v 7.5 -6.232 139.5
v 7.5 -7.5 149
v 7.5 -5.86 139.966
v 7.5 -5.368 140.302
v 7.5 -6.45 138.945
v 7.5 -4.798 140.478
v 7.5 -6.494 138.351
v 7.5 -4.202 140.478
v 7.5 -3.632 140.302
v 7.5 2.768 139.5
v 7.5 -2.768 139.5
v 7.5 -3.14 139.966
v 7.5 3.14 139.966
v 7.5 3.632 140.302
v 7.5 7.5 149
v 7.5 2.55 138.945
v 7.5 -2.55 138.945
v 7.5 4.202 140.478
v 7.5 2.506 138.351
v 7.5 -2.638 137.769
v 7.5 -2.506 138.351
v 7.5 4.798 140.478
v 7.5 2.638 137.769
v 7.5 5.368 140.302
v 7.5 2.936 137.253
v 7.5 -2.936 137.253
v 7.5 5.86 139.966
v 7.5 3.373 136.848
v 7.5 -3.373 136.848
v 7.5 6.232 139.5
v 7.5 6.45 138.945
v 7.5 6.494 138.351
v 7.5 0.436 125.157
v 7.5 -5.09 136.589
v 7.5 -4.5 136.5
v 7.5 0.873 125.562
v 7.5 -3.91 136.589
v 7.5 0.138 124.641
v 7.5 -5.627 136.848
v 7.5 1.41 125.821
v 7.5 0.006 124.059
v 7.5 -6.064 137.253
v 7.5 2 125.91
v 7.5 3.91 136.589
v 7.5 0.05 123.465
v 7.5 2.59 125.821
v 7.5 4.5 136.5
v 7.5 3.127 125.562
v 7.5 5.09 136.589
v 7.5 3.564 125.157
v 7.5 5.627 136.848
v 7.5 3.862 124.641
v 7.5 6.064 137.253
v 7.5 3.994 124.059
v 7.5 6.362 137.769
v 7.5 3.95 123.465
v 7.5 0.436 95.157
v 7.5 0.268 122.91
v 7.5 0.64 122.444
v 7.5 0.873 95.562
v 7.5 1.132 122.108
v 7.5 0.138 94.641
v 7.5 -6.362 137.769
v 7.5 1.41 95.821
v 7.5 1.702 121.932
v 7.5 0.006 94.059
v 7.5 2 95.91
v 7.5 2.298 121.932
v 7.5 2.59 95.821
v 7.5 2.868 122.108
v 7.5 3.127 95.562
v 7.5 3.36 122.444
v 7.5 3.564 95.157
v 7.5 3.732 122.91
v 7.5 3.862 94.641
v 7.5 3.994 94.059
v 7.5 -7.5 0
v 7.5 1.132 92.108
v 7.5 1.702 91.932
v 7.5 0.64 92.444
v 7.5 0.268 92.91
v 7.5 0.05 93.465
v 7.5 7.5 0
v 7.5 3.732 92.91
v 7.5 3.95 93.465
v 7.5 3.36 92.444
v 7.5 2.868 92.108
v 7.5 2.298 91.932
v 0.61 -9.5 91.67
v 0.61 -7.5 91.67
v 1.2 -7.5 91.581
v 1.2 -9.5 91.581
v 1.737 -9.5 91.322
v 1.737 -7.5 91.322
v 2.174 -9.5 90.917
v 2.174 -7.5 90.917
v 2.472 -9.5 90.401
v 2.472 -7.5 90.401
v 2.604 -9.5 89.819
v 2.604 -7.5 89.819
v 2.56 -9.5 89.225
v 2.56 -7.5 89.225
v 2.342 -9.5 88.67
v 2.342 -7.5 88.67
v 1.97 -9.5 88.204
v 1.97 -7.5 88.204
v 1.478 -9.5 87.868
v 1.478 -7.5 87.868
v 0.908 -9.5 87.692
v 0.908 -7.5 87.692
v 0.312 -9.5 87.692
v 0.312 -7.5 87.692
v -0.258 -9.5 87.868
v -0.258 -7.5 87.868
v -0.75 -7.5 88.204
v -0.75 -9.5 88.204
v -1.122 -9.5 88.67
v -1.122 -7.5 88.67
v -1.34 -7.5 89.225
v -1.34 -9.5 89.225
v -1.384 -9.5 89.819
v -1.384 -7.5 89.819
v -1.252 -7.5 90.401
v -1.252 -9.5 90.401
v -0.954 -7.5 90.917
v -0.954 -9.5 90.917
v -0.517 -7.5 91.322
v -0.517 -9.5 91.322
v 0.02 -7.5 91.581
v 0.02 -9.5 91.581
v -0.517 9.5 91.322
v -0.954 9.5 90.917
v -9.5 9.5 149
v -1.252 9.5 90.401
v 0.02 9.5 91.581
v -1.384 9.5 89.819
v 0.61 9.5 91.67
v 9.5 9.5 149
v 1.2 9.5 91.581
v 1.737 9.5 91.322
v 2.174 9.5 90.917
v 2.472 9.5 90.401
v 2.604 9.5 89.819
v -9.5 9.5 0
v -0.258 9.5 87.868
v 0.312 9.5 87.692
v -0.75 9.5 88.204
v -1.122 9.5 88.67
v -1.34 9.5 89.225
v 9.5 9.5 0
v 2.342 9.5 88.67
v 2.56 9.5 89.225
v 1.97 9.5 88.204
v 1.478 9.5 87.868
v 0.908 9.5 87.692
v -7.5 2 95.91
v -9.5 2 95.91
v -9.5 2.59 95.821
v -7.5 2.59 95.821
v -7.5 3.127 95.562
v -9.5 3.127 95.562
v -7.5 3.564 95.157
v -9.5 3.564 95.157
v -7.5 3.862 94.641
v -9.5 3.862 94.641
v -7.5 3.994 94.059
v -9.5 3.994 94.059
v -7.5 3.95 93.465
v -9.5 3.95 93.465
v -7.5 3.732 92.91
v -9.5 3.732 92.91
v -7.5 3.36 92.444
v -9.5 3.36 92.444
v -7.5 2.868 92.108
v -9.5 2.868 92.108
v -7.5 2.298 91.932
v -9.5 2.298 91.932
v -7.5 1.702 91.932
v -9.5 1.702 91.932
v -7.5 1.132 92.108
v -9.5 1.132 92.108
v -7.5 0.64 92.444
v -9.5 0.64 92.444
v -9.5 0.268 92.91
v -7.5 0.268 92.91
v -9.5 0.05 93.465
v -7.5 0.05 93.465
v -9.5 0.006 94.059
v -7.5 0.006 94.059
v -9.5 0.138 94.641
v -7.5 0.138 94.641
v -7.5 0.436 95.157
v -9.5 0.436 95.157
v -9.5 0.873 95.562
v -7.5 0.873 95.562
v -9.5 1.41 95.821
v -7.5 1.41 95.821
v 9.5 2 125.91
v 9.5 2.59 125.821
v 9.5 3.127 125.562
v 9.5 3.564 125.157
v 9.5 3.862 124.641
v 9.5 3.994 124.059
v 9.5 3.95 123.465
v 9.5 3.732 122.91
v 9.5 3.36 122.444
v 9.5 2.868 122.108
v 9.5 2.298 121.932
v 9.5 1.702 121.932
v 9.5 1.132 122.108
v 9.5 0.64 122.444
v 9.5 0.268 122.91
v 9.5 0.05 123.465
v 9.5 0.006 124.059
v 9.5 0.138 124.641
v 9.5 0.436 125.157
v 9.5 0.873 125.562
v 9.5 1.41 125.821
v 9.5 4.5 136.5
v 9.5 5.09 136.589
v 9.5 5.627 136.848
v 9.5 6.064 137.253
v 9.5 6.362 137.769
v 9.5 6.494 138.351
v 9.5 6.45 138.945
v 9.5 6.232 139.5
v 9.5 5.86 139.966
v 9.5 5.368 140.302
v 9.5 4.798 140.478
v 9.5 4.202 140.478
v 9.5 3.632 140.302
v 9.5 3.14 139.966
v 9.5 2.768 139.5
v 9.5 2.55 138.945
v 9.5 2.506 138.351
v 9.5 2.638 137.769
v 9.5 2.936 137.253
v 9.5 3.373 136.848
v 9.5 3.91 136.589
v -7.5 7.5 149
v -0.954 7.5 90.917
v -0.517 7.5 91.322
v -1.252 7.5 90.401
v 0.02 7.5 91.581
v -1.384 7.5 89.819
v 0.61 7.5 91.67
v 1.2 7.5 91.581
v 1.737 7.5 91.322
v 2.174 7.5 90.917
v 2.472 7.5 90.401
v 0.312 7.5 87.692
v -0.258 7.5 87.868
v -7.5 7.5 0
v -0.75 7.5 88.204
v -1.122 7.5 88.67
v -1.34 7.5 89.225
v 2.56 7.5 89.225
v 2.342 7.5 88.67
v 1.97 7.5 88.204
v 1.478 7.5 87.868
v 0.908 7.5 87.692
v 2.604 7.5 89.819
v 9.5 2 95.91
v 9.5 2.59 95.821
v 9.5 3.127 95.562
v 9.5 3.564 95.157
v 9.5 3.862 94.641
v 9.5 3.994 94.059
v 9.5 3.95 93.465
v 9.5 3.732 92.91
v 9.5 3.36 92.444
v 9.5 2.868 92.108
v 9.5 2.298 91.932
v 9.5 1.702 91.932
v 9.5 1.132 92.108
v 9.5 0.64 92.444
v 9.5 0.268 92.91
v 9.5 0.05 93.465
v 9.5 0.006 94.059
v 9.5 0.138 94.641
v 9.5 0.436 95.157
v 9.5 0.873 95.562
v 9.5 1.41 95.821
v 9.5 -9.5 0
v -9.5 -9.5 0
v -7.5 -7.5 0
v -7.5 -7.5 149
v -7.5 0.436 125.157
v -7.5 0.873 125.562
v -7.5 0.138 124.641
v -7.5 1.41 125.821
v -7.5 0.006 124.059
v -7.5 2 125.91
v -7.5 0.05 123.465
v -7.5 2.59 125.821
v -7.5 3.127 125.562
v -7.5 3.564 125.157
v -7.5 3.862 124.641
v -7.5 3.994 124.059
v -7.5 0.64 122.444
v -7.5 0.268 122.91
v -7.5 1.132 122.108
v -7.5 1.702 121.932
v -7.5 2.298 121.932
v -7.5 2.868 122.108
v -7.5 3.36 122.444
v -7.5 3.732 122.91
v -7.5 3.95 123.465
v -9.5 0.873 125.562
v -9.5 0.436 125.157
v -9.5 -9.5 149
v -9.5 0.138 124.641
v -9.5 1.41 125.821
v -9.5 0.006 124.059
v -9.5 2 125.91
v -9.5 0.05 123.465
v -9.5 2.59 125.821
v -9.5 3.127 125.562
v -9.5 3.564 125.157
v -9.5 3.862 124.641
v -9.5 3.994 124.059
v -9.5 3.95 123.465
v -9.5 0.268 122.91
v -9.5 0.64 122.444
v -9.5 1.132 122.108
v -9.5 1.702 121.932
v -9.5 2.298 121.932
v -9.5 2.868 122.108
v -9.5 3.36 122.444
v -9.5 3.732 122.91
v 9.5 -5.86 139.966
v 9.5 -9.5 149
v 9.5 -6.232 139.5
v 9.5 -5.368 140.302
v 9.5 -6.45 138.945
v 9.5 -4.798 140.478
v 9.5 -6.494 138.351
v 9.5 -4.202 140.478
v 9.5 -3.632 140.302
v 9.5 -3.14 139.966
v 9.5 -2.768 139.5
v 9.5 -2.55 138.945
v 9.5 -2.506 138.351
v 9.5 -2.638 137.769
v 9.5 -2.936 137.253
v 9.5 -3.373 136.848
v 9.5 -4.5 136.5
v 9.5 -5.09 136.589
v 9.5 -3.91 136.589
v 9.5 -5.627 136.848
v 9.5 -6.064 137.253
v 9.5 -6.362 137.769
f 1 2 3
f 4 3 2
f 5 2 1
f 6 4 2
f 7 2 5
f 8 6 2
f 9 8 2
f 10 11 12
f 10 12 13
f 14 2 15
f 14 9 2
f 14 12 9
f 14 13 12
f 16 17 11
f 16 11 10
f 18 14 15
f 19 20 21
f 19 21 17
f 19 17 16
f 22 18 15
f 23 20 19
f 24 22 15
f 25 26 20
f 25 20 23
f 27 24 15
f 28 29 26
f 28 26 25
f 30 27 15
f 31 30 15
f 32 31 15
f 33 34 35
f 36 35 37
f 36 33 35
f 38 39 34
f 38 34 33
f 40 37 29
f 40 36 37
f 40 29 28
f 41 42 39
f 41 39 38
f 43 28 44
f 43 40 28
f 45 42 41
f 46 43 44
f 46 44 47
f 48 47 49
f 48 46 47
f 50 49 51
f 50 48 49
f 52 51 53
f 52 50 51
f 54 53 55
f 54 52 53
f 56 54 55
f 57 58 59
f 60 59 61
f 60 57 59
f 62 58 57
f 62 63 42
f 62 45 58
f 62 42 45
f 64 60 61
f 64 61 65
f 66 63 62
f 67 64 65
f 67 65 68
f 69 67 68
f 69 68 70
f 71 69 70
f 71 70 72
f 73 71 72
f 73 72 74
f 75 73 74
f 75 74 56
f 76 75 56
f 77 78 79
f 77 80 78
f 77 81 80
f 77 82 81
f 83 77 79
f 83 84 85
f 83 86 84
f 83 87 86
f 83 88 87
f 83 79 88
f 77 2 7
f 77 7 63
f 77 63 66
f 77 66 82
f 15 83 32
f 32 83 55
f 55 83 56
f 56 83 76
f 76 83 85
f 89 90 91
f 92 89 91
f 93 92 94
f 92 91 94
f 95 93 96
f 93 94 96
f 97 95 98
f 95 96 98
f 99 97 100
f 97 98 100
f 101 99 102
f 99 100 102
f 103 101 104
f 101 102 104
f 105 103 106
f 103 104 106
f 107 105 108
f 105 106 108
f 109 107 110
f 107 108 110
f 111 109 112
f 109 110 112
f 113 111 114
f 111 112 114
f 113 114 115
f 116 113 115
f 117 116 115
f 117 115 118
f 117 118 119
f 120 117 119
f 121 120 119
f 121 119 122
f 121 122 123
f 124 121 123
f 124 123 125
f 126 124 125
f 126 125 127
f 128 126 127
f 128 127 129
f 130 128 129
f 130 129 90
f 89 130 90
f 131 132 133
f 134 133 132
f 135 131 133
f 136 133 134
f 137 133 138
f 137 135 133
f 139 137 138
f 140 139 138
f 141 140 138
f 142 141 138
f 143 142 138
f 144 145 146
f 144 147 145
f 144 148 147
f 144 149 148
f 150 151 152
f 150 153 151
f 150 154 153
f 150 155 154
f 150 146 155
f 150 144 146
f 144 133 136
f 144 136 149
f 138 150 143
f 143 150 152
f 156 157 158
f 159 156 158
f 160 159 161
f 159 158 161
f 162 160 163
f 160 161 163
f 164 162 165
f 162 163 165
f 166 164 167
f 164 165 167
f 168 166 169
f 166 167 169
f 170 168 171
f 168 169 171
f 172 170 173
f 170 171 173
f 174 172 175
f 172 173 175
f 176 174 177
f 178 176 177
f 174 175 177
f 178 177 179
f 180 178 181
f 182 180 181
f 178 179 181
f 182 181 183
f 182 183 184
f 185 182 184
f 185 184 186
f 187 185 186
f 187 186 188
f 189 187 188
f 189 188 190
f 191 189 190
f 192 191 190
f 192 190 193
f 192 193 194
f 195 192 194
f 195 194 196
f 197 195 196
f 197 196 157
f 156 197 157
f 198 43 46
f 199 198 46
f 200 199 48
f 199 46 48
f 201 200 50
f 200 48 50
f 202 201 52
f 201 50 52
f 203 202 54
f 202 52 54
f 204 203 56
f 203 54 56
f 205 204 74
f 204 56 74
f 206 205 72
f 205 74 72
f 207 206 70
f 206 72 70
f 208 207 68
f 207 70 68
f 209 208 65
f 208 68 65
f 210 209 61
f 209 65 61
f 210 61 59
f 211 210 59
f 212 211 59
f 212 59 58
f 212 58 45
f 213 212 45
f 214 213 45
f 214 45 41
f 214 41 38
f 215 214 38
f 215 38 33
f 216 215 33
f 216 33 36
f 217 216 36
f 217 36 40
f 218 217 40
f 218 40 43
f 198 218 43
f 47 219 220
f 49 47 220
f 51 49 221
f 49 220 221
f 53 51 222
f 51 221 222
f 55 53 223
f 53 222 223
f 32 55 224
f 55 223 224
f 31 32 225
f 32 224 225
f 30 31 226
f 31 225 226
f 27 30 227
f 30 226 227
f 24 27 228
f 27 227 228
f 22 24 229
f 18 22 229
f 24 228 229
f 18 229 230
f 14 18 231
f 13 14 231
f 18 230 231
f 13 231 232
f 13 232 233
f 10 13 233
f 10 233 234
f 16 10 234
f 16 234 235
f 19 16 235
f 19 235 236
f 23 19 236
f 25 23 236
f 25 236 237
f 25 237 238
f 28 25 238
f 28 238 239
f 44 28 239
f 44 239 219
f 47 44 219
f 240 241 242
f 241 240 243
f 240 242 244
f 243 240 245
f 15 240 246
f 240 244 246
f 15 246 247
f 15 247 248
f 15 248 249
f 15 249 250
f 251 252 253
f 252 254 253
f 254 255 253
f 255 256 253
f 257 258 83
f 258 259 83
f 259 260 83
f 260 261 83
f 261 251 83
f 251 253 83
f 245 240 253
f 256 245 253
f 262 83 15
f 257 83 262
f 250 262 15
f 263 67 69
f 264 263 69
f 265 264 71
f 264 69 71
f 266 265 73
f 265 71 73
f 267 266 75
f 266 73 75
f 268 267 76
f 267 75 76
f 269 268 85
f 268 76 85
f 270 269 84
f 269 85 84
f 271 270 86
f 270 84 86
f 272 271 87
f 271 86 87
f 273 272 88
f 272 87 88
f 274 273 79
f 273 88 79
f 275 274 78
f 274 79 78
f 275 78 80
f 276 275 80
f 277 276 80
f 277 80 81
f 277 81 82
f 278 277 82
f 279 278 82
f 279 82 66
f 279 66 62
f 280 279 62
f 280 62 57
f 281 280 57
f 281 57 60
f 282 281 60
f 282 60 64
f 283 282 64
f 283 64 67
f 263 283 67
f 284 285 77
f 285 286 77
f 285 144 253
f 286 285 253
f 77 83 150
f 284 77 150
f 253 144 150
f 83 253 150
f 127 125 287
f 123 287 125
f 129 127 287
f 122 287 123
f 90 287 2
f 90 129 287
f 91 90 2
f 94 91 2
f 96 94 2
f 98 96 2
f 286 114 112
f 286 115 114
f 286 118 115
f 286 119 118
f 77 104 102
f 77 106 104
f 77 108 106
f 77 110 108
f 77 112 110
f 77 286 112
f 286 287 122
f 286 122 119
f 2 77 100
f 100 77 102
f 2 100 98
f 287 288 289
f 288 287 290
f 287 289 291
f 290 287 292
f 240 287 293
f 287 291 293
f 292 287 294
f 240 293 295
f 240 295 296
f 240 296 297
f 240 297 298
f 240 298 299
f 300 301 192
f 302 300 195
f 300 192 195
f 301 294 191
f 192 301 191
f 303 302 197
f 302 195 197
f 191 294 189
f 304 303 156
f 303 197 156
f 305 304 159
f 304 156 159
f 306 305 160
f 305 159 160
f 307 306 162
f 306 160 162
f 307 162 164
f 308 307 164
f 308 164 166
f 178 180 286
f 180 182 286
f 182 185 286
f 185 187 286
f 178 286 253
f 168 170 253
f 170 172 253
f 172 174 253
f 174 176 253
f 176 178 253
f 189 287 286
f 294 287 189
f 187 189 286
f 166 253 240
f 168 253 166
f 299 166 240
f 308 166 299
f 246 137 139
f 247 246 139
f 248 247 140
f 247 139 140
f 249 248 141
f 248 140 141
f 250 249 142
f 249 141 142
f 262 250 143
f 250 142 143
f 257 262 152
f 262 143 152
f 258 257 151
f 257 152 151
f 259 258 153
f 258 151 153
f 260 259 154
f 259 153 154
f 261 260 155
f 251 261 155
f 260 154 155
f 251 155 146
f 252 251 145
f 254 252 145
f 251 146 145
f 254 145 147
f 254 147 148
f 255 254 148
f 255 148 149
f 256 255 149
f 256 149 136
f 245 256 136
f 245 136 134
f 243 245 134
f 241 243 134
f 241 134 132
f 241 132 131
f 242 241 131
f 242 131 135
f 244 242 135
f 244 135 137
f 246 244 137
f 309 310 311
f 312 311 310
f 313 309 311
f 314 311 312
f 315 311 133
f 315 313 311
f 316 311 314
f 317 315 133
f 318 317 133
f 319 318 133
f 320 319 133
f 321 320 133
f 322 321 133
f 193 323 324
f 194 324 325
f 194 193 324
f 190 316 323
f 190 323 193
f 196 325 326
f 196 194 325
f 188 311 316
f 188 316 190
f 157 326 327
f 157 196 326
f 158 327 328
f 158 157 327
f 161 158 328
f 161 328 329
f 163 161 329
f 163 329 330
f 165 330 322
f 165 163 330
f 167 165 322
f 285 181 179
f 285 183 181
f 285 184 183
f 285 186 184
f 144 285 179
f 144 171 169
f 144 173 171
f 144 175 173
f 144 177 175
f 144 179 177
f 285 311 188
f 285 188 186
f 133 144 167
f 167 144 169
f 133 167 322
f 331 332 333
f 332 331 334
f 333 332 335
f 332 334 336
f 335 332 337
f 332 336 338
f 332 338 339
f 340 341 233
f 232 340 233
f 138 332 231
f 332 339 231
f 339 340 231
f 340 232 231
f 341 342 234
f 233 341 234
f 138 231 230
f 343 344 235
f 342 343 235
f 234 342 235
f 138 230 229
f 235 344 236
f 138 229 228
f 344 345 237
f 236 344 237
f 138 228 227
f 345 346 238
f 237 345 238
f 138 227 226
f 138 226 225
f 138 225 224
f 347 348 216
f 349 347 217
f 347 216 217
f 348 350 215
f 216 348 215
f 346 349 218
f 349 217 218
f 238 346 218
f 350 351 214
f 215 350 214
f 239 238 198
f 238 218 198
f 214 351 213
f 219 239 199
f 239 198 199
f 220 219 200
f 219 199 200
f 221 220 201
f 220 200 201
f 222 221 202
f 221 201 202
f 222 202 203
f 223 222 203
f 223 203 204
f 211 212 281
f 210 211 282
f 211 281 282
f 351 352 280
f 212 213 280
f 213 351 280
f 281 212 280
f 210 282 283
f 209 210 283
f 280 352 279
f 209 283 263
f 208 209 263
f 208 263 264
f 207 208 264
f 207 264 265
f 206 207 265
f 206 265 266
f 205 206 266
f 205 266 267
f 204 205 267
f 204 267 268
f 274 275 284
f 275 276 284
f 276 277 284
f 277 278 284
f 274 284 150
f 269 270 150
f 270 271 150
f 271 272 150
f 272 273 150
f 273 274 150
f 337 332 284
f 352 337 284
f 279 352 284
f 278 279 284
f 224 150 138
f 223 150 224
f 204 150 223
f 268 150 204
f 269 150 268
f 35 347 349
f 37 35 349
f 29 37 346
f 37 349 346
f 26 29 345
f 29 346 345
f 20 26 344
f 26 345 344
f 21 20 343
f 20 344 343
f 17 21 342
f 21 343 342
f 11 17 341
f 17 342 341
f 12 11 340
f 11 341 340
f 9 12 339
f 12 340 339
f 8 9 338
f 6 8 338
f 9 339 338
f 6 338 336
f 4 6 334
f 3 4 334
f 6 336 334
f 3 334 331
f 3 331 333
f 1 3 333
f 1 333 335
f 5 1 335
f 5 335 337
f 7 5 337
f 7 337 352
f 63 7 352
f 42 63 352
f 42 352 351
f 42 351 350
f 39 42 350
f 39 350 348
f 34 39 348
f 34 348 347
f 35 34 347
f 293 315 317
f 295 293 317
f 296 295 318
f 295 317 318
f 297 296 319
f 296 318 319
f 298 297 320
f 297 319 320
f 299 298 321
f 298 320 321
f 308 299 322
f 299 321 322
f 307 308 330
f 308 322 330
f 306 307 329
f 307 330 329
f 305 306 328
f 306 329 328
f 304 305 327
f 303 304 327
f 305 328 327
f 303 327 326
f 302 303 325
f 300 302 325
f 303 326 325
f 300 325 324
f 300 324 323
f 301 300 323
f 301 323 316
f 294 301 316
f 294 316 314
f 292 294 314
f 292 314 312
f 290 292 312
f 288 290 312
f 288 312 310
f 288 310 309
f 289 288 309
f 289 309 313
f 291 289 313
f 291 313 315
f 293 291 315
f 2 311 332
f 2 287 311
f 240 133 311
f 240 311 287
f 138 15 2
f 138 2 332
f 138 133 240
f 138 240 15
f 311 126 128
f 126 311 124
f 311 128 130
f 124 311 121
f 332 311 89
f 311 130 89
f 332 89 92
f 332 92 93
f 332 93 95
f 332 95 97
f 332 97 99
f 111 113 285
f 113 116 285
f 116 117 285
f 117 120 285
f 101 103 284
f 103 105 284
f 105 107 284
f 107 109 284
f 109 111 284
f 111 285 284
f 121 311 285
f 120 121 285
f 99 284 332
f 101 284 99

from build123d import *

# Parameters (mm, degrees)
SKETCH1_W           = 19
SKETCH1_H           = 19
SKETCH1_W_2         = 15
SKETCH1_H_2         = 15
BOSS_EXTRUDE1_DEPTH = 149
SKETCH2_R           = 2
CUT_EXTRUDE1_DEPTH  = 10
SKETCH5_R           = 2
CUT_EXTRUDE2_DEPTH  = 151.506644372
SKETCH6_R           = 2
CUT_EXTRUDE3_DEPTH  = 151.506644372


with BuildPart() as part:
    # Sketch1 → Boss-Extrude1 (new body)
    with BuildSketch(Plane.XY):
        Rectangle(SKETCH1_W, SKETCH1_H)
        Rectangle(SKETCH1_W_2, SKETCH1_H_2, mode=Mode.SUBTRACT)
    extrude(amount=BOSS_EXTRUDE1_DEPTH)

    # Sketch2 → Cut-Extrude1 (cut)
    with BuildSketch(Plane(origin=(9.5, 0, 0), x_dir=(0, 0, -1), z_dir=(1, 0, 0))):
        with Locations((-138.5, 4.5)):
            Circle(SKETCH2_R)
        with Locations((-138.5, -4.5)):
            Circle(SKETCH2_R)
    extrude(amount=-CUT_EXTRUDE1_DEPTH, mode=Mode.SUBTRACT)

    # Sketch5 → Cut-Extrude2 (cut, through all)
    with BuildSketch(Plane(origin=(0, 9.5, 0), x_dir=(1, 0, 0), z_dir=(0, 1, 0))):
        with Locations(Location((0.61, -89.67, 0), (0, 0, 270))):
            Circle(SKETCH5_R)
    extrude(amount=-CUT_EXTRUDE2_DEPTH, mode=Mode.SUBTRACT)

    # Sketch6 → Cut-Extrude3 (cut, through all)
    with BuildSketch(Plane.ZY.offset(9.5)):
        with Locations((93.91, 2)):
            Circle(SKETCH6_R)
        with Locations((123.91, 2)):
            Circle(SKETCH6_R)
    extrude(amount=-CUT_EXTRUDE3_DEPTH, mode=Mode.SUBTRACT)


solid = part.part
